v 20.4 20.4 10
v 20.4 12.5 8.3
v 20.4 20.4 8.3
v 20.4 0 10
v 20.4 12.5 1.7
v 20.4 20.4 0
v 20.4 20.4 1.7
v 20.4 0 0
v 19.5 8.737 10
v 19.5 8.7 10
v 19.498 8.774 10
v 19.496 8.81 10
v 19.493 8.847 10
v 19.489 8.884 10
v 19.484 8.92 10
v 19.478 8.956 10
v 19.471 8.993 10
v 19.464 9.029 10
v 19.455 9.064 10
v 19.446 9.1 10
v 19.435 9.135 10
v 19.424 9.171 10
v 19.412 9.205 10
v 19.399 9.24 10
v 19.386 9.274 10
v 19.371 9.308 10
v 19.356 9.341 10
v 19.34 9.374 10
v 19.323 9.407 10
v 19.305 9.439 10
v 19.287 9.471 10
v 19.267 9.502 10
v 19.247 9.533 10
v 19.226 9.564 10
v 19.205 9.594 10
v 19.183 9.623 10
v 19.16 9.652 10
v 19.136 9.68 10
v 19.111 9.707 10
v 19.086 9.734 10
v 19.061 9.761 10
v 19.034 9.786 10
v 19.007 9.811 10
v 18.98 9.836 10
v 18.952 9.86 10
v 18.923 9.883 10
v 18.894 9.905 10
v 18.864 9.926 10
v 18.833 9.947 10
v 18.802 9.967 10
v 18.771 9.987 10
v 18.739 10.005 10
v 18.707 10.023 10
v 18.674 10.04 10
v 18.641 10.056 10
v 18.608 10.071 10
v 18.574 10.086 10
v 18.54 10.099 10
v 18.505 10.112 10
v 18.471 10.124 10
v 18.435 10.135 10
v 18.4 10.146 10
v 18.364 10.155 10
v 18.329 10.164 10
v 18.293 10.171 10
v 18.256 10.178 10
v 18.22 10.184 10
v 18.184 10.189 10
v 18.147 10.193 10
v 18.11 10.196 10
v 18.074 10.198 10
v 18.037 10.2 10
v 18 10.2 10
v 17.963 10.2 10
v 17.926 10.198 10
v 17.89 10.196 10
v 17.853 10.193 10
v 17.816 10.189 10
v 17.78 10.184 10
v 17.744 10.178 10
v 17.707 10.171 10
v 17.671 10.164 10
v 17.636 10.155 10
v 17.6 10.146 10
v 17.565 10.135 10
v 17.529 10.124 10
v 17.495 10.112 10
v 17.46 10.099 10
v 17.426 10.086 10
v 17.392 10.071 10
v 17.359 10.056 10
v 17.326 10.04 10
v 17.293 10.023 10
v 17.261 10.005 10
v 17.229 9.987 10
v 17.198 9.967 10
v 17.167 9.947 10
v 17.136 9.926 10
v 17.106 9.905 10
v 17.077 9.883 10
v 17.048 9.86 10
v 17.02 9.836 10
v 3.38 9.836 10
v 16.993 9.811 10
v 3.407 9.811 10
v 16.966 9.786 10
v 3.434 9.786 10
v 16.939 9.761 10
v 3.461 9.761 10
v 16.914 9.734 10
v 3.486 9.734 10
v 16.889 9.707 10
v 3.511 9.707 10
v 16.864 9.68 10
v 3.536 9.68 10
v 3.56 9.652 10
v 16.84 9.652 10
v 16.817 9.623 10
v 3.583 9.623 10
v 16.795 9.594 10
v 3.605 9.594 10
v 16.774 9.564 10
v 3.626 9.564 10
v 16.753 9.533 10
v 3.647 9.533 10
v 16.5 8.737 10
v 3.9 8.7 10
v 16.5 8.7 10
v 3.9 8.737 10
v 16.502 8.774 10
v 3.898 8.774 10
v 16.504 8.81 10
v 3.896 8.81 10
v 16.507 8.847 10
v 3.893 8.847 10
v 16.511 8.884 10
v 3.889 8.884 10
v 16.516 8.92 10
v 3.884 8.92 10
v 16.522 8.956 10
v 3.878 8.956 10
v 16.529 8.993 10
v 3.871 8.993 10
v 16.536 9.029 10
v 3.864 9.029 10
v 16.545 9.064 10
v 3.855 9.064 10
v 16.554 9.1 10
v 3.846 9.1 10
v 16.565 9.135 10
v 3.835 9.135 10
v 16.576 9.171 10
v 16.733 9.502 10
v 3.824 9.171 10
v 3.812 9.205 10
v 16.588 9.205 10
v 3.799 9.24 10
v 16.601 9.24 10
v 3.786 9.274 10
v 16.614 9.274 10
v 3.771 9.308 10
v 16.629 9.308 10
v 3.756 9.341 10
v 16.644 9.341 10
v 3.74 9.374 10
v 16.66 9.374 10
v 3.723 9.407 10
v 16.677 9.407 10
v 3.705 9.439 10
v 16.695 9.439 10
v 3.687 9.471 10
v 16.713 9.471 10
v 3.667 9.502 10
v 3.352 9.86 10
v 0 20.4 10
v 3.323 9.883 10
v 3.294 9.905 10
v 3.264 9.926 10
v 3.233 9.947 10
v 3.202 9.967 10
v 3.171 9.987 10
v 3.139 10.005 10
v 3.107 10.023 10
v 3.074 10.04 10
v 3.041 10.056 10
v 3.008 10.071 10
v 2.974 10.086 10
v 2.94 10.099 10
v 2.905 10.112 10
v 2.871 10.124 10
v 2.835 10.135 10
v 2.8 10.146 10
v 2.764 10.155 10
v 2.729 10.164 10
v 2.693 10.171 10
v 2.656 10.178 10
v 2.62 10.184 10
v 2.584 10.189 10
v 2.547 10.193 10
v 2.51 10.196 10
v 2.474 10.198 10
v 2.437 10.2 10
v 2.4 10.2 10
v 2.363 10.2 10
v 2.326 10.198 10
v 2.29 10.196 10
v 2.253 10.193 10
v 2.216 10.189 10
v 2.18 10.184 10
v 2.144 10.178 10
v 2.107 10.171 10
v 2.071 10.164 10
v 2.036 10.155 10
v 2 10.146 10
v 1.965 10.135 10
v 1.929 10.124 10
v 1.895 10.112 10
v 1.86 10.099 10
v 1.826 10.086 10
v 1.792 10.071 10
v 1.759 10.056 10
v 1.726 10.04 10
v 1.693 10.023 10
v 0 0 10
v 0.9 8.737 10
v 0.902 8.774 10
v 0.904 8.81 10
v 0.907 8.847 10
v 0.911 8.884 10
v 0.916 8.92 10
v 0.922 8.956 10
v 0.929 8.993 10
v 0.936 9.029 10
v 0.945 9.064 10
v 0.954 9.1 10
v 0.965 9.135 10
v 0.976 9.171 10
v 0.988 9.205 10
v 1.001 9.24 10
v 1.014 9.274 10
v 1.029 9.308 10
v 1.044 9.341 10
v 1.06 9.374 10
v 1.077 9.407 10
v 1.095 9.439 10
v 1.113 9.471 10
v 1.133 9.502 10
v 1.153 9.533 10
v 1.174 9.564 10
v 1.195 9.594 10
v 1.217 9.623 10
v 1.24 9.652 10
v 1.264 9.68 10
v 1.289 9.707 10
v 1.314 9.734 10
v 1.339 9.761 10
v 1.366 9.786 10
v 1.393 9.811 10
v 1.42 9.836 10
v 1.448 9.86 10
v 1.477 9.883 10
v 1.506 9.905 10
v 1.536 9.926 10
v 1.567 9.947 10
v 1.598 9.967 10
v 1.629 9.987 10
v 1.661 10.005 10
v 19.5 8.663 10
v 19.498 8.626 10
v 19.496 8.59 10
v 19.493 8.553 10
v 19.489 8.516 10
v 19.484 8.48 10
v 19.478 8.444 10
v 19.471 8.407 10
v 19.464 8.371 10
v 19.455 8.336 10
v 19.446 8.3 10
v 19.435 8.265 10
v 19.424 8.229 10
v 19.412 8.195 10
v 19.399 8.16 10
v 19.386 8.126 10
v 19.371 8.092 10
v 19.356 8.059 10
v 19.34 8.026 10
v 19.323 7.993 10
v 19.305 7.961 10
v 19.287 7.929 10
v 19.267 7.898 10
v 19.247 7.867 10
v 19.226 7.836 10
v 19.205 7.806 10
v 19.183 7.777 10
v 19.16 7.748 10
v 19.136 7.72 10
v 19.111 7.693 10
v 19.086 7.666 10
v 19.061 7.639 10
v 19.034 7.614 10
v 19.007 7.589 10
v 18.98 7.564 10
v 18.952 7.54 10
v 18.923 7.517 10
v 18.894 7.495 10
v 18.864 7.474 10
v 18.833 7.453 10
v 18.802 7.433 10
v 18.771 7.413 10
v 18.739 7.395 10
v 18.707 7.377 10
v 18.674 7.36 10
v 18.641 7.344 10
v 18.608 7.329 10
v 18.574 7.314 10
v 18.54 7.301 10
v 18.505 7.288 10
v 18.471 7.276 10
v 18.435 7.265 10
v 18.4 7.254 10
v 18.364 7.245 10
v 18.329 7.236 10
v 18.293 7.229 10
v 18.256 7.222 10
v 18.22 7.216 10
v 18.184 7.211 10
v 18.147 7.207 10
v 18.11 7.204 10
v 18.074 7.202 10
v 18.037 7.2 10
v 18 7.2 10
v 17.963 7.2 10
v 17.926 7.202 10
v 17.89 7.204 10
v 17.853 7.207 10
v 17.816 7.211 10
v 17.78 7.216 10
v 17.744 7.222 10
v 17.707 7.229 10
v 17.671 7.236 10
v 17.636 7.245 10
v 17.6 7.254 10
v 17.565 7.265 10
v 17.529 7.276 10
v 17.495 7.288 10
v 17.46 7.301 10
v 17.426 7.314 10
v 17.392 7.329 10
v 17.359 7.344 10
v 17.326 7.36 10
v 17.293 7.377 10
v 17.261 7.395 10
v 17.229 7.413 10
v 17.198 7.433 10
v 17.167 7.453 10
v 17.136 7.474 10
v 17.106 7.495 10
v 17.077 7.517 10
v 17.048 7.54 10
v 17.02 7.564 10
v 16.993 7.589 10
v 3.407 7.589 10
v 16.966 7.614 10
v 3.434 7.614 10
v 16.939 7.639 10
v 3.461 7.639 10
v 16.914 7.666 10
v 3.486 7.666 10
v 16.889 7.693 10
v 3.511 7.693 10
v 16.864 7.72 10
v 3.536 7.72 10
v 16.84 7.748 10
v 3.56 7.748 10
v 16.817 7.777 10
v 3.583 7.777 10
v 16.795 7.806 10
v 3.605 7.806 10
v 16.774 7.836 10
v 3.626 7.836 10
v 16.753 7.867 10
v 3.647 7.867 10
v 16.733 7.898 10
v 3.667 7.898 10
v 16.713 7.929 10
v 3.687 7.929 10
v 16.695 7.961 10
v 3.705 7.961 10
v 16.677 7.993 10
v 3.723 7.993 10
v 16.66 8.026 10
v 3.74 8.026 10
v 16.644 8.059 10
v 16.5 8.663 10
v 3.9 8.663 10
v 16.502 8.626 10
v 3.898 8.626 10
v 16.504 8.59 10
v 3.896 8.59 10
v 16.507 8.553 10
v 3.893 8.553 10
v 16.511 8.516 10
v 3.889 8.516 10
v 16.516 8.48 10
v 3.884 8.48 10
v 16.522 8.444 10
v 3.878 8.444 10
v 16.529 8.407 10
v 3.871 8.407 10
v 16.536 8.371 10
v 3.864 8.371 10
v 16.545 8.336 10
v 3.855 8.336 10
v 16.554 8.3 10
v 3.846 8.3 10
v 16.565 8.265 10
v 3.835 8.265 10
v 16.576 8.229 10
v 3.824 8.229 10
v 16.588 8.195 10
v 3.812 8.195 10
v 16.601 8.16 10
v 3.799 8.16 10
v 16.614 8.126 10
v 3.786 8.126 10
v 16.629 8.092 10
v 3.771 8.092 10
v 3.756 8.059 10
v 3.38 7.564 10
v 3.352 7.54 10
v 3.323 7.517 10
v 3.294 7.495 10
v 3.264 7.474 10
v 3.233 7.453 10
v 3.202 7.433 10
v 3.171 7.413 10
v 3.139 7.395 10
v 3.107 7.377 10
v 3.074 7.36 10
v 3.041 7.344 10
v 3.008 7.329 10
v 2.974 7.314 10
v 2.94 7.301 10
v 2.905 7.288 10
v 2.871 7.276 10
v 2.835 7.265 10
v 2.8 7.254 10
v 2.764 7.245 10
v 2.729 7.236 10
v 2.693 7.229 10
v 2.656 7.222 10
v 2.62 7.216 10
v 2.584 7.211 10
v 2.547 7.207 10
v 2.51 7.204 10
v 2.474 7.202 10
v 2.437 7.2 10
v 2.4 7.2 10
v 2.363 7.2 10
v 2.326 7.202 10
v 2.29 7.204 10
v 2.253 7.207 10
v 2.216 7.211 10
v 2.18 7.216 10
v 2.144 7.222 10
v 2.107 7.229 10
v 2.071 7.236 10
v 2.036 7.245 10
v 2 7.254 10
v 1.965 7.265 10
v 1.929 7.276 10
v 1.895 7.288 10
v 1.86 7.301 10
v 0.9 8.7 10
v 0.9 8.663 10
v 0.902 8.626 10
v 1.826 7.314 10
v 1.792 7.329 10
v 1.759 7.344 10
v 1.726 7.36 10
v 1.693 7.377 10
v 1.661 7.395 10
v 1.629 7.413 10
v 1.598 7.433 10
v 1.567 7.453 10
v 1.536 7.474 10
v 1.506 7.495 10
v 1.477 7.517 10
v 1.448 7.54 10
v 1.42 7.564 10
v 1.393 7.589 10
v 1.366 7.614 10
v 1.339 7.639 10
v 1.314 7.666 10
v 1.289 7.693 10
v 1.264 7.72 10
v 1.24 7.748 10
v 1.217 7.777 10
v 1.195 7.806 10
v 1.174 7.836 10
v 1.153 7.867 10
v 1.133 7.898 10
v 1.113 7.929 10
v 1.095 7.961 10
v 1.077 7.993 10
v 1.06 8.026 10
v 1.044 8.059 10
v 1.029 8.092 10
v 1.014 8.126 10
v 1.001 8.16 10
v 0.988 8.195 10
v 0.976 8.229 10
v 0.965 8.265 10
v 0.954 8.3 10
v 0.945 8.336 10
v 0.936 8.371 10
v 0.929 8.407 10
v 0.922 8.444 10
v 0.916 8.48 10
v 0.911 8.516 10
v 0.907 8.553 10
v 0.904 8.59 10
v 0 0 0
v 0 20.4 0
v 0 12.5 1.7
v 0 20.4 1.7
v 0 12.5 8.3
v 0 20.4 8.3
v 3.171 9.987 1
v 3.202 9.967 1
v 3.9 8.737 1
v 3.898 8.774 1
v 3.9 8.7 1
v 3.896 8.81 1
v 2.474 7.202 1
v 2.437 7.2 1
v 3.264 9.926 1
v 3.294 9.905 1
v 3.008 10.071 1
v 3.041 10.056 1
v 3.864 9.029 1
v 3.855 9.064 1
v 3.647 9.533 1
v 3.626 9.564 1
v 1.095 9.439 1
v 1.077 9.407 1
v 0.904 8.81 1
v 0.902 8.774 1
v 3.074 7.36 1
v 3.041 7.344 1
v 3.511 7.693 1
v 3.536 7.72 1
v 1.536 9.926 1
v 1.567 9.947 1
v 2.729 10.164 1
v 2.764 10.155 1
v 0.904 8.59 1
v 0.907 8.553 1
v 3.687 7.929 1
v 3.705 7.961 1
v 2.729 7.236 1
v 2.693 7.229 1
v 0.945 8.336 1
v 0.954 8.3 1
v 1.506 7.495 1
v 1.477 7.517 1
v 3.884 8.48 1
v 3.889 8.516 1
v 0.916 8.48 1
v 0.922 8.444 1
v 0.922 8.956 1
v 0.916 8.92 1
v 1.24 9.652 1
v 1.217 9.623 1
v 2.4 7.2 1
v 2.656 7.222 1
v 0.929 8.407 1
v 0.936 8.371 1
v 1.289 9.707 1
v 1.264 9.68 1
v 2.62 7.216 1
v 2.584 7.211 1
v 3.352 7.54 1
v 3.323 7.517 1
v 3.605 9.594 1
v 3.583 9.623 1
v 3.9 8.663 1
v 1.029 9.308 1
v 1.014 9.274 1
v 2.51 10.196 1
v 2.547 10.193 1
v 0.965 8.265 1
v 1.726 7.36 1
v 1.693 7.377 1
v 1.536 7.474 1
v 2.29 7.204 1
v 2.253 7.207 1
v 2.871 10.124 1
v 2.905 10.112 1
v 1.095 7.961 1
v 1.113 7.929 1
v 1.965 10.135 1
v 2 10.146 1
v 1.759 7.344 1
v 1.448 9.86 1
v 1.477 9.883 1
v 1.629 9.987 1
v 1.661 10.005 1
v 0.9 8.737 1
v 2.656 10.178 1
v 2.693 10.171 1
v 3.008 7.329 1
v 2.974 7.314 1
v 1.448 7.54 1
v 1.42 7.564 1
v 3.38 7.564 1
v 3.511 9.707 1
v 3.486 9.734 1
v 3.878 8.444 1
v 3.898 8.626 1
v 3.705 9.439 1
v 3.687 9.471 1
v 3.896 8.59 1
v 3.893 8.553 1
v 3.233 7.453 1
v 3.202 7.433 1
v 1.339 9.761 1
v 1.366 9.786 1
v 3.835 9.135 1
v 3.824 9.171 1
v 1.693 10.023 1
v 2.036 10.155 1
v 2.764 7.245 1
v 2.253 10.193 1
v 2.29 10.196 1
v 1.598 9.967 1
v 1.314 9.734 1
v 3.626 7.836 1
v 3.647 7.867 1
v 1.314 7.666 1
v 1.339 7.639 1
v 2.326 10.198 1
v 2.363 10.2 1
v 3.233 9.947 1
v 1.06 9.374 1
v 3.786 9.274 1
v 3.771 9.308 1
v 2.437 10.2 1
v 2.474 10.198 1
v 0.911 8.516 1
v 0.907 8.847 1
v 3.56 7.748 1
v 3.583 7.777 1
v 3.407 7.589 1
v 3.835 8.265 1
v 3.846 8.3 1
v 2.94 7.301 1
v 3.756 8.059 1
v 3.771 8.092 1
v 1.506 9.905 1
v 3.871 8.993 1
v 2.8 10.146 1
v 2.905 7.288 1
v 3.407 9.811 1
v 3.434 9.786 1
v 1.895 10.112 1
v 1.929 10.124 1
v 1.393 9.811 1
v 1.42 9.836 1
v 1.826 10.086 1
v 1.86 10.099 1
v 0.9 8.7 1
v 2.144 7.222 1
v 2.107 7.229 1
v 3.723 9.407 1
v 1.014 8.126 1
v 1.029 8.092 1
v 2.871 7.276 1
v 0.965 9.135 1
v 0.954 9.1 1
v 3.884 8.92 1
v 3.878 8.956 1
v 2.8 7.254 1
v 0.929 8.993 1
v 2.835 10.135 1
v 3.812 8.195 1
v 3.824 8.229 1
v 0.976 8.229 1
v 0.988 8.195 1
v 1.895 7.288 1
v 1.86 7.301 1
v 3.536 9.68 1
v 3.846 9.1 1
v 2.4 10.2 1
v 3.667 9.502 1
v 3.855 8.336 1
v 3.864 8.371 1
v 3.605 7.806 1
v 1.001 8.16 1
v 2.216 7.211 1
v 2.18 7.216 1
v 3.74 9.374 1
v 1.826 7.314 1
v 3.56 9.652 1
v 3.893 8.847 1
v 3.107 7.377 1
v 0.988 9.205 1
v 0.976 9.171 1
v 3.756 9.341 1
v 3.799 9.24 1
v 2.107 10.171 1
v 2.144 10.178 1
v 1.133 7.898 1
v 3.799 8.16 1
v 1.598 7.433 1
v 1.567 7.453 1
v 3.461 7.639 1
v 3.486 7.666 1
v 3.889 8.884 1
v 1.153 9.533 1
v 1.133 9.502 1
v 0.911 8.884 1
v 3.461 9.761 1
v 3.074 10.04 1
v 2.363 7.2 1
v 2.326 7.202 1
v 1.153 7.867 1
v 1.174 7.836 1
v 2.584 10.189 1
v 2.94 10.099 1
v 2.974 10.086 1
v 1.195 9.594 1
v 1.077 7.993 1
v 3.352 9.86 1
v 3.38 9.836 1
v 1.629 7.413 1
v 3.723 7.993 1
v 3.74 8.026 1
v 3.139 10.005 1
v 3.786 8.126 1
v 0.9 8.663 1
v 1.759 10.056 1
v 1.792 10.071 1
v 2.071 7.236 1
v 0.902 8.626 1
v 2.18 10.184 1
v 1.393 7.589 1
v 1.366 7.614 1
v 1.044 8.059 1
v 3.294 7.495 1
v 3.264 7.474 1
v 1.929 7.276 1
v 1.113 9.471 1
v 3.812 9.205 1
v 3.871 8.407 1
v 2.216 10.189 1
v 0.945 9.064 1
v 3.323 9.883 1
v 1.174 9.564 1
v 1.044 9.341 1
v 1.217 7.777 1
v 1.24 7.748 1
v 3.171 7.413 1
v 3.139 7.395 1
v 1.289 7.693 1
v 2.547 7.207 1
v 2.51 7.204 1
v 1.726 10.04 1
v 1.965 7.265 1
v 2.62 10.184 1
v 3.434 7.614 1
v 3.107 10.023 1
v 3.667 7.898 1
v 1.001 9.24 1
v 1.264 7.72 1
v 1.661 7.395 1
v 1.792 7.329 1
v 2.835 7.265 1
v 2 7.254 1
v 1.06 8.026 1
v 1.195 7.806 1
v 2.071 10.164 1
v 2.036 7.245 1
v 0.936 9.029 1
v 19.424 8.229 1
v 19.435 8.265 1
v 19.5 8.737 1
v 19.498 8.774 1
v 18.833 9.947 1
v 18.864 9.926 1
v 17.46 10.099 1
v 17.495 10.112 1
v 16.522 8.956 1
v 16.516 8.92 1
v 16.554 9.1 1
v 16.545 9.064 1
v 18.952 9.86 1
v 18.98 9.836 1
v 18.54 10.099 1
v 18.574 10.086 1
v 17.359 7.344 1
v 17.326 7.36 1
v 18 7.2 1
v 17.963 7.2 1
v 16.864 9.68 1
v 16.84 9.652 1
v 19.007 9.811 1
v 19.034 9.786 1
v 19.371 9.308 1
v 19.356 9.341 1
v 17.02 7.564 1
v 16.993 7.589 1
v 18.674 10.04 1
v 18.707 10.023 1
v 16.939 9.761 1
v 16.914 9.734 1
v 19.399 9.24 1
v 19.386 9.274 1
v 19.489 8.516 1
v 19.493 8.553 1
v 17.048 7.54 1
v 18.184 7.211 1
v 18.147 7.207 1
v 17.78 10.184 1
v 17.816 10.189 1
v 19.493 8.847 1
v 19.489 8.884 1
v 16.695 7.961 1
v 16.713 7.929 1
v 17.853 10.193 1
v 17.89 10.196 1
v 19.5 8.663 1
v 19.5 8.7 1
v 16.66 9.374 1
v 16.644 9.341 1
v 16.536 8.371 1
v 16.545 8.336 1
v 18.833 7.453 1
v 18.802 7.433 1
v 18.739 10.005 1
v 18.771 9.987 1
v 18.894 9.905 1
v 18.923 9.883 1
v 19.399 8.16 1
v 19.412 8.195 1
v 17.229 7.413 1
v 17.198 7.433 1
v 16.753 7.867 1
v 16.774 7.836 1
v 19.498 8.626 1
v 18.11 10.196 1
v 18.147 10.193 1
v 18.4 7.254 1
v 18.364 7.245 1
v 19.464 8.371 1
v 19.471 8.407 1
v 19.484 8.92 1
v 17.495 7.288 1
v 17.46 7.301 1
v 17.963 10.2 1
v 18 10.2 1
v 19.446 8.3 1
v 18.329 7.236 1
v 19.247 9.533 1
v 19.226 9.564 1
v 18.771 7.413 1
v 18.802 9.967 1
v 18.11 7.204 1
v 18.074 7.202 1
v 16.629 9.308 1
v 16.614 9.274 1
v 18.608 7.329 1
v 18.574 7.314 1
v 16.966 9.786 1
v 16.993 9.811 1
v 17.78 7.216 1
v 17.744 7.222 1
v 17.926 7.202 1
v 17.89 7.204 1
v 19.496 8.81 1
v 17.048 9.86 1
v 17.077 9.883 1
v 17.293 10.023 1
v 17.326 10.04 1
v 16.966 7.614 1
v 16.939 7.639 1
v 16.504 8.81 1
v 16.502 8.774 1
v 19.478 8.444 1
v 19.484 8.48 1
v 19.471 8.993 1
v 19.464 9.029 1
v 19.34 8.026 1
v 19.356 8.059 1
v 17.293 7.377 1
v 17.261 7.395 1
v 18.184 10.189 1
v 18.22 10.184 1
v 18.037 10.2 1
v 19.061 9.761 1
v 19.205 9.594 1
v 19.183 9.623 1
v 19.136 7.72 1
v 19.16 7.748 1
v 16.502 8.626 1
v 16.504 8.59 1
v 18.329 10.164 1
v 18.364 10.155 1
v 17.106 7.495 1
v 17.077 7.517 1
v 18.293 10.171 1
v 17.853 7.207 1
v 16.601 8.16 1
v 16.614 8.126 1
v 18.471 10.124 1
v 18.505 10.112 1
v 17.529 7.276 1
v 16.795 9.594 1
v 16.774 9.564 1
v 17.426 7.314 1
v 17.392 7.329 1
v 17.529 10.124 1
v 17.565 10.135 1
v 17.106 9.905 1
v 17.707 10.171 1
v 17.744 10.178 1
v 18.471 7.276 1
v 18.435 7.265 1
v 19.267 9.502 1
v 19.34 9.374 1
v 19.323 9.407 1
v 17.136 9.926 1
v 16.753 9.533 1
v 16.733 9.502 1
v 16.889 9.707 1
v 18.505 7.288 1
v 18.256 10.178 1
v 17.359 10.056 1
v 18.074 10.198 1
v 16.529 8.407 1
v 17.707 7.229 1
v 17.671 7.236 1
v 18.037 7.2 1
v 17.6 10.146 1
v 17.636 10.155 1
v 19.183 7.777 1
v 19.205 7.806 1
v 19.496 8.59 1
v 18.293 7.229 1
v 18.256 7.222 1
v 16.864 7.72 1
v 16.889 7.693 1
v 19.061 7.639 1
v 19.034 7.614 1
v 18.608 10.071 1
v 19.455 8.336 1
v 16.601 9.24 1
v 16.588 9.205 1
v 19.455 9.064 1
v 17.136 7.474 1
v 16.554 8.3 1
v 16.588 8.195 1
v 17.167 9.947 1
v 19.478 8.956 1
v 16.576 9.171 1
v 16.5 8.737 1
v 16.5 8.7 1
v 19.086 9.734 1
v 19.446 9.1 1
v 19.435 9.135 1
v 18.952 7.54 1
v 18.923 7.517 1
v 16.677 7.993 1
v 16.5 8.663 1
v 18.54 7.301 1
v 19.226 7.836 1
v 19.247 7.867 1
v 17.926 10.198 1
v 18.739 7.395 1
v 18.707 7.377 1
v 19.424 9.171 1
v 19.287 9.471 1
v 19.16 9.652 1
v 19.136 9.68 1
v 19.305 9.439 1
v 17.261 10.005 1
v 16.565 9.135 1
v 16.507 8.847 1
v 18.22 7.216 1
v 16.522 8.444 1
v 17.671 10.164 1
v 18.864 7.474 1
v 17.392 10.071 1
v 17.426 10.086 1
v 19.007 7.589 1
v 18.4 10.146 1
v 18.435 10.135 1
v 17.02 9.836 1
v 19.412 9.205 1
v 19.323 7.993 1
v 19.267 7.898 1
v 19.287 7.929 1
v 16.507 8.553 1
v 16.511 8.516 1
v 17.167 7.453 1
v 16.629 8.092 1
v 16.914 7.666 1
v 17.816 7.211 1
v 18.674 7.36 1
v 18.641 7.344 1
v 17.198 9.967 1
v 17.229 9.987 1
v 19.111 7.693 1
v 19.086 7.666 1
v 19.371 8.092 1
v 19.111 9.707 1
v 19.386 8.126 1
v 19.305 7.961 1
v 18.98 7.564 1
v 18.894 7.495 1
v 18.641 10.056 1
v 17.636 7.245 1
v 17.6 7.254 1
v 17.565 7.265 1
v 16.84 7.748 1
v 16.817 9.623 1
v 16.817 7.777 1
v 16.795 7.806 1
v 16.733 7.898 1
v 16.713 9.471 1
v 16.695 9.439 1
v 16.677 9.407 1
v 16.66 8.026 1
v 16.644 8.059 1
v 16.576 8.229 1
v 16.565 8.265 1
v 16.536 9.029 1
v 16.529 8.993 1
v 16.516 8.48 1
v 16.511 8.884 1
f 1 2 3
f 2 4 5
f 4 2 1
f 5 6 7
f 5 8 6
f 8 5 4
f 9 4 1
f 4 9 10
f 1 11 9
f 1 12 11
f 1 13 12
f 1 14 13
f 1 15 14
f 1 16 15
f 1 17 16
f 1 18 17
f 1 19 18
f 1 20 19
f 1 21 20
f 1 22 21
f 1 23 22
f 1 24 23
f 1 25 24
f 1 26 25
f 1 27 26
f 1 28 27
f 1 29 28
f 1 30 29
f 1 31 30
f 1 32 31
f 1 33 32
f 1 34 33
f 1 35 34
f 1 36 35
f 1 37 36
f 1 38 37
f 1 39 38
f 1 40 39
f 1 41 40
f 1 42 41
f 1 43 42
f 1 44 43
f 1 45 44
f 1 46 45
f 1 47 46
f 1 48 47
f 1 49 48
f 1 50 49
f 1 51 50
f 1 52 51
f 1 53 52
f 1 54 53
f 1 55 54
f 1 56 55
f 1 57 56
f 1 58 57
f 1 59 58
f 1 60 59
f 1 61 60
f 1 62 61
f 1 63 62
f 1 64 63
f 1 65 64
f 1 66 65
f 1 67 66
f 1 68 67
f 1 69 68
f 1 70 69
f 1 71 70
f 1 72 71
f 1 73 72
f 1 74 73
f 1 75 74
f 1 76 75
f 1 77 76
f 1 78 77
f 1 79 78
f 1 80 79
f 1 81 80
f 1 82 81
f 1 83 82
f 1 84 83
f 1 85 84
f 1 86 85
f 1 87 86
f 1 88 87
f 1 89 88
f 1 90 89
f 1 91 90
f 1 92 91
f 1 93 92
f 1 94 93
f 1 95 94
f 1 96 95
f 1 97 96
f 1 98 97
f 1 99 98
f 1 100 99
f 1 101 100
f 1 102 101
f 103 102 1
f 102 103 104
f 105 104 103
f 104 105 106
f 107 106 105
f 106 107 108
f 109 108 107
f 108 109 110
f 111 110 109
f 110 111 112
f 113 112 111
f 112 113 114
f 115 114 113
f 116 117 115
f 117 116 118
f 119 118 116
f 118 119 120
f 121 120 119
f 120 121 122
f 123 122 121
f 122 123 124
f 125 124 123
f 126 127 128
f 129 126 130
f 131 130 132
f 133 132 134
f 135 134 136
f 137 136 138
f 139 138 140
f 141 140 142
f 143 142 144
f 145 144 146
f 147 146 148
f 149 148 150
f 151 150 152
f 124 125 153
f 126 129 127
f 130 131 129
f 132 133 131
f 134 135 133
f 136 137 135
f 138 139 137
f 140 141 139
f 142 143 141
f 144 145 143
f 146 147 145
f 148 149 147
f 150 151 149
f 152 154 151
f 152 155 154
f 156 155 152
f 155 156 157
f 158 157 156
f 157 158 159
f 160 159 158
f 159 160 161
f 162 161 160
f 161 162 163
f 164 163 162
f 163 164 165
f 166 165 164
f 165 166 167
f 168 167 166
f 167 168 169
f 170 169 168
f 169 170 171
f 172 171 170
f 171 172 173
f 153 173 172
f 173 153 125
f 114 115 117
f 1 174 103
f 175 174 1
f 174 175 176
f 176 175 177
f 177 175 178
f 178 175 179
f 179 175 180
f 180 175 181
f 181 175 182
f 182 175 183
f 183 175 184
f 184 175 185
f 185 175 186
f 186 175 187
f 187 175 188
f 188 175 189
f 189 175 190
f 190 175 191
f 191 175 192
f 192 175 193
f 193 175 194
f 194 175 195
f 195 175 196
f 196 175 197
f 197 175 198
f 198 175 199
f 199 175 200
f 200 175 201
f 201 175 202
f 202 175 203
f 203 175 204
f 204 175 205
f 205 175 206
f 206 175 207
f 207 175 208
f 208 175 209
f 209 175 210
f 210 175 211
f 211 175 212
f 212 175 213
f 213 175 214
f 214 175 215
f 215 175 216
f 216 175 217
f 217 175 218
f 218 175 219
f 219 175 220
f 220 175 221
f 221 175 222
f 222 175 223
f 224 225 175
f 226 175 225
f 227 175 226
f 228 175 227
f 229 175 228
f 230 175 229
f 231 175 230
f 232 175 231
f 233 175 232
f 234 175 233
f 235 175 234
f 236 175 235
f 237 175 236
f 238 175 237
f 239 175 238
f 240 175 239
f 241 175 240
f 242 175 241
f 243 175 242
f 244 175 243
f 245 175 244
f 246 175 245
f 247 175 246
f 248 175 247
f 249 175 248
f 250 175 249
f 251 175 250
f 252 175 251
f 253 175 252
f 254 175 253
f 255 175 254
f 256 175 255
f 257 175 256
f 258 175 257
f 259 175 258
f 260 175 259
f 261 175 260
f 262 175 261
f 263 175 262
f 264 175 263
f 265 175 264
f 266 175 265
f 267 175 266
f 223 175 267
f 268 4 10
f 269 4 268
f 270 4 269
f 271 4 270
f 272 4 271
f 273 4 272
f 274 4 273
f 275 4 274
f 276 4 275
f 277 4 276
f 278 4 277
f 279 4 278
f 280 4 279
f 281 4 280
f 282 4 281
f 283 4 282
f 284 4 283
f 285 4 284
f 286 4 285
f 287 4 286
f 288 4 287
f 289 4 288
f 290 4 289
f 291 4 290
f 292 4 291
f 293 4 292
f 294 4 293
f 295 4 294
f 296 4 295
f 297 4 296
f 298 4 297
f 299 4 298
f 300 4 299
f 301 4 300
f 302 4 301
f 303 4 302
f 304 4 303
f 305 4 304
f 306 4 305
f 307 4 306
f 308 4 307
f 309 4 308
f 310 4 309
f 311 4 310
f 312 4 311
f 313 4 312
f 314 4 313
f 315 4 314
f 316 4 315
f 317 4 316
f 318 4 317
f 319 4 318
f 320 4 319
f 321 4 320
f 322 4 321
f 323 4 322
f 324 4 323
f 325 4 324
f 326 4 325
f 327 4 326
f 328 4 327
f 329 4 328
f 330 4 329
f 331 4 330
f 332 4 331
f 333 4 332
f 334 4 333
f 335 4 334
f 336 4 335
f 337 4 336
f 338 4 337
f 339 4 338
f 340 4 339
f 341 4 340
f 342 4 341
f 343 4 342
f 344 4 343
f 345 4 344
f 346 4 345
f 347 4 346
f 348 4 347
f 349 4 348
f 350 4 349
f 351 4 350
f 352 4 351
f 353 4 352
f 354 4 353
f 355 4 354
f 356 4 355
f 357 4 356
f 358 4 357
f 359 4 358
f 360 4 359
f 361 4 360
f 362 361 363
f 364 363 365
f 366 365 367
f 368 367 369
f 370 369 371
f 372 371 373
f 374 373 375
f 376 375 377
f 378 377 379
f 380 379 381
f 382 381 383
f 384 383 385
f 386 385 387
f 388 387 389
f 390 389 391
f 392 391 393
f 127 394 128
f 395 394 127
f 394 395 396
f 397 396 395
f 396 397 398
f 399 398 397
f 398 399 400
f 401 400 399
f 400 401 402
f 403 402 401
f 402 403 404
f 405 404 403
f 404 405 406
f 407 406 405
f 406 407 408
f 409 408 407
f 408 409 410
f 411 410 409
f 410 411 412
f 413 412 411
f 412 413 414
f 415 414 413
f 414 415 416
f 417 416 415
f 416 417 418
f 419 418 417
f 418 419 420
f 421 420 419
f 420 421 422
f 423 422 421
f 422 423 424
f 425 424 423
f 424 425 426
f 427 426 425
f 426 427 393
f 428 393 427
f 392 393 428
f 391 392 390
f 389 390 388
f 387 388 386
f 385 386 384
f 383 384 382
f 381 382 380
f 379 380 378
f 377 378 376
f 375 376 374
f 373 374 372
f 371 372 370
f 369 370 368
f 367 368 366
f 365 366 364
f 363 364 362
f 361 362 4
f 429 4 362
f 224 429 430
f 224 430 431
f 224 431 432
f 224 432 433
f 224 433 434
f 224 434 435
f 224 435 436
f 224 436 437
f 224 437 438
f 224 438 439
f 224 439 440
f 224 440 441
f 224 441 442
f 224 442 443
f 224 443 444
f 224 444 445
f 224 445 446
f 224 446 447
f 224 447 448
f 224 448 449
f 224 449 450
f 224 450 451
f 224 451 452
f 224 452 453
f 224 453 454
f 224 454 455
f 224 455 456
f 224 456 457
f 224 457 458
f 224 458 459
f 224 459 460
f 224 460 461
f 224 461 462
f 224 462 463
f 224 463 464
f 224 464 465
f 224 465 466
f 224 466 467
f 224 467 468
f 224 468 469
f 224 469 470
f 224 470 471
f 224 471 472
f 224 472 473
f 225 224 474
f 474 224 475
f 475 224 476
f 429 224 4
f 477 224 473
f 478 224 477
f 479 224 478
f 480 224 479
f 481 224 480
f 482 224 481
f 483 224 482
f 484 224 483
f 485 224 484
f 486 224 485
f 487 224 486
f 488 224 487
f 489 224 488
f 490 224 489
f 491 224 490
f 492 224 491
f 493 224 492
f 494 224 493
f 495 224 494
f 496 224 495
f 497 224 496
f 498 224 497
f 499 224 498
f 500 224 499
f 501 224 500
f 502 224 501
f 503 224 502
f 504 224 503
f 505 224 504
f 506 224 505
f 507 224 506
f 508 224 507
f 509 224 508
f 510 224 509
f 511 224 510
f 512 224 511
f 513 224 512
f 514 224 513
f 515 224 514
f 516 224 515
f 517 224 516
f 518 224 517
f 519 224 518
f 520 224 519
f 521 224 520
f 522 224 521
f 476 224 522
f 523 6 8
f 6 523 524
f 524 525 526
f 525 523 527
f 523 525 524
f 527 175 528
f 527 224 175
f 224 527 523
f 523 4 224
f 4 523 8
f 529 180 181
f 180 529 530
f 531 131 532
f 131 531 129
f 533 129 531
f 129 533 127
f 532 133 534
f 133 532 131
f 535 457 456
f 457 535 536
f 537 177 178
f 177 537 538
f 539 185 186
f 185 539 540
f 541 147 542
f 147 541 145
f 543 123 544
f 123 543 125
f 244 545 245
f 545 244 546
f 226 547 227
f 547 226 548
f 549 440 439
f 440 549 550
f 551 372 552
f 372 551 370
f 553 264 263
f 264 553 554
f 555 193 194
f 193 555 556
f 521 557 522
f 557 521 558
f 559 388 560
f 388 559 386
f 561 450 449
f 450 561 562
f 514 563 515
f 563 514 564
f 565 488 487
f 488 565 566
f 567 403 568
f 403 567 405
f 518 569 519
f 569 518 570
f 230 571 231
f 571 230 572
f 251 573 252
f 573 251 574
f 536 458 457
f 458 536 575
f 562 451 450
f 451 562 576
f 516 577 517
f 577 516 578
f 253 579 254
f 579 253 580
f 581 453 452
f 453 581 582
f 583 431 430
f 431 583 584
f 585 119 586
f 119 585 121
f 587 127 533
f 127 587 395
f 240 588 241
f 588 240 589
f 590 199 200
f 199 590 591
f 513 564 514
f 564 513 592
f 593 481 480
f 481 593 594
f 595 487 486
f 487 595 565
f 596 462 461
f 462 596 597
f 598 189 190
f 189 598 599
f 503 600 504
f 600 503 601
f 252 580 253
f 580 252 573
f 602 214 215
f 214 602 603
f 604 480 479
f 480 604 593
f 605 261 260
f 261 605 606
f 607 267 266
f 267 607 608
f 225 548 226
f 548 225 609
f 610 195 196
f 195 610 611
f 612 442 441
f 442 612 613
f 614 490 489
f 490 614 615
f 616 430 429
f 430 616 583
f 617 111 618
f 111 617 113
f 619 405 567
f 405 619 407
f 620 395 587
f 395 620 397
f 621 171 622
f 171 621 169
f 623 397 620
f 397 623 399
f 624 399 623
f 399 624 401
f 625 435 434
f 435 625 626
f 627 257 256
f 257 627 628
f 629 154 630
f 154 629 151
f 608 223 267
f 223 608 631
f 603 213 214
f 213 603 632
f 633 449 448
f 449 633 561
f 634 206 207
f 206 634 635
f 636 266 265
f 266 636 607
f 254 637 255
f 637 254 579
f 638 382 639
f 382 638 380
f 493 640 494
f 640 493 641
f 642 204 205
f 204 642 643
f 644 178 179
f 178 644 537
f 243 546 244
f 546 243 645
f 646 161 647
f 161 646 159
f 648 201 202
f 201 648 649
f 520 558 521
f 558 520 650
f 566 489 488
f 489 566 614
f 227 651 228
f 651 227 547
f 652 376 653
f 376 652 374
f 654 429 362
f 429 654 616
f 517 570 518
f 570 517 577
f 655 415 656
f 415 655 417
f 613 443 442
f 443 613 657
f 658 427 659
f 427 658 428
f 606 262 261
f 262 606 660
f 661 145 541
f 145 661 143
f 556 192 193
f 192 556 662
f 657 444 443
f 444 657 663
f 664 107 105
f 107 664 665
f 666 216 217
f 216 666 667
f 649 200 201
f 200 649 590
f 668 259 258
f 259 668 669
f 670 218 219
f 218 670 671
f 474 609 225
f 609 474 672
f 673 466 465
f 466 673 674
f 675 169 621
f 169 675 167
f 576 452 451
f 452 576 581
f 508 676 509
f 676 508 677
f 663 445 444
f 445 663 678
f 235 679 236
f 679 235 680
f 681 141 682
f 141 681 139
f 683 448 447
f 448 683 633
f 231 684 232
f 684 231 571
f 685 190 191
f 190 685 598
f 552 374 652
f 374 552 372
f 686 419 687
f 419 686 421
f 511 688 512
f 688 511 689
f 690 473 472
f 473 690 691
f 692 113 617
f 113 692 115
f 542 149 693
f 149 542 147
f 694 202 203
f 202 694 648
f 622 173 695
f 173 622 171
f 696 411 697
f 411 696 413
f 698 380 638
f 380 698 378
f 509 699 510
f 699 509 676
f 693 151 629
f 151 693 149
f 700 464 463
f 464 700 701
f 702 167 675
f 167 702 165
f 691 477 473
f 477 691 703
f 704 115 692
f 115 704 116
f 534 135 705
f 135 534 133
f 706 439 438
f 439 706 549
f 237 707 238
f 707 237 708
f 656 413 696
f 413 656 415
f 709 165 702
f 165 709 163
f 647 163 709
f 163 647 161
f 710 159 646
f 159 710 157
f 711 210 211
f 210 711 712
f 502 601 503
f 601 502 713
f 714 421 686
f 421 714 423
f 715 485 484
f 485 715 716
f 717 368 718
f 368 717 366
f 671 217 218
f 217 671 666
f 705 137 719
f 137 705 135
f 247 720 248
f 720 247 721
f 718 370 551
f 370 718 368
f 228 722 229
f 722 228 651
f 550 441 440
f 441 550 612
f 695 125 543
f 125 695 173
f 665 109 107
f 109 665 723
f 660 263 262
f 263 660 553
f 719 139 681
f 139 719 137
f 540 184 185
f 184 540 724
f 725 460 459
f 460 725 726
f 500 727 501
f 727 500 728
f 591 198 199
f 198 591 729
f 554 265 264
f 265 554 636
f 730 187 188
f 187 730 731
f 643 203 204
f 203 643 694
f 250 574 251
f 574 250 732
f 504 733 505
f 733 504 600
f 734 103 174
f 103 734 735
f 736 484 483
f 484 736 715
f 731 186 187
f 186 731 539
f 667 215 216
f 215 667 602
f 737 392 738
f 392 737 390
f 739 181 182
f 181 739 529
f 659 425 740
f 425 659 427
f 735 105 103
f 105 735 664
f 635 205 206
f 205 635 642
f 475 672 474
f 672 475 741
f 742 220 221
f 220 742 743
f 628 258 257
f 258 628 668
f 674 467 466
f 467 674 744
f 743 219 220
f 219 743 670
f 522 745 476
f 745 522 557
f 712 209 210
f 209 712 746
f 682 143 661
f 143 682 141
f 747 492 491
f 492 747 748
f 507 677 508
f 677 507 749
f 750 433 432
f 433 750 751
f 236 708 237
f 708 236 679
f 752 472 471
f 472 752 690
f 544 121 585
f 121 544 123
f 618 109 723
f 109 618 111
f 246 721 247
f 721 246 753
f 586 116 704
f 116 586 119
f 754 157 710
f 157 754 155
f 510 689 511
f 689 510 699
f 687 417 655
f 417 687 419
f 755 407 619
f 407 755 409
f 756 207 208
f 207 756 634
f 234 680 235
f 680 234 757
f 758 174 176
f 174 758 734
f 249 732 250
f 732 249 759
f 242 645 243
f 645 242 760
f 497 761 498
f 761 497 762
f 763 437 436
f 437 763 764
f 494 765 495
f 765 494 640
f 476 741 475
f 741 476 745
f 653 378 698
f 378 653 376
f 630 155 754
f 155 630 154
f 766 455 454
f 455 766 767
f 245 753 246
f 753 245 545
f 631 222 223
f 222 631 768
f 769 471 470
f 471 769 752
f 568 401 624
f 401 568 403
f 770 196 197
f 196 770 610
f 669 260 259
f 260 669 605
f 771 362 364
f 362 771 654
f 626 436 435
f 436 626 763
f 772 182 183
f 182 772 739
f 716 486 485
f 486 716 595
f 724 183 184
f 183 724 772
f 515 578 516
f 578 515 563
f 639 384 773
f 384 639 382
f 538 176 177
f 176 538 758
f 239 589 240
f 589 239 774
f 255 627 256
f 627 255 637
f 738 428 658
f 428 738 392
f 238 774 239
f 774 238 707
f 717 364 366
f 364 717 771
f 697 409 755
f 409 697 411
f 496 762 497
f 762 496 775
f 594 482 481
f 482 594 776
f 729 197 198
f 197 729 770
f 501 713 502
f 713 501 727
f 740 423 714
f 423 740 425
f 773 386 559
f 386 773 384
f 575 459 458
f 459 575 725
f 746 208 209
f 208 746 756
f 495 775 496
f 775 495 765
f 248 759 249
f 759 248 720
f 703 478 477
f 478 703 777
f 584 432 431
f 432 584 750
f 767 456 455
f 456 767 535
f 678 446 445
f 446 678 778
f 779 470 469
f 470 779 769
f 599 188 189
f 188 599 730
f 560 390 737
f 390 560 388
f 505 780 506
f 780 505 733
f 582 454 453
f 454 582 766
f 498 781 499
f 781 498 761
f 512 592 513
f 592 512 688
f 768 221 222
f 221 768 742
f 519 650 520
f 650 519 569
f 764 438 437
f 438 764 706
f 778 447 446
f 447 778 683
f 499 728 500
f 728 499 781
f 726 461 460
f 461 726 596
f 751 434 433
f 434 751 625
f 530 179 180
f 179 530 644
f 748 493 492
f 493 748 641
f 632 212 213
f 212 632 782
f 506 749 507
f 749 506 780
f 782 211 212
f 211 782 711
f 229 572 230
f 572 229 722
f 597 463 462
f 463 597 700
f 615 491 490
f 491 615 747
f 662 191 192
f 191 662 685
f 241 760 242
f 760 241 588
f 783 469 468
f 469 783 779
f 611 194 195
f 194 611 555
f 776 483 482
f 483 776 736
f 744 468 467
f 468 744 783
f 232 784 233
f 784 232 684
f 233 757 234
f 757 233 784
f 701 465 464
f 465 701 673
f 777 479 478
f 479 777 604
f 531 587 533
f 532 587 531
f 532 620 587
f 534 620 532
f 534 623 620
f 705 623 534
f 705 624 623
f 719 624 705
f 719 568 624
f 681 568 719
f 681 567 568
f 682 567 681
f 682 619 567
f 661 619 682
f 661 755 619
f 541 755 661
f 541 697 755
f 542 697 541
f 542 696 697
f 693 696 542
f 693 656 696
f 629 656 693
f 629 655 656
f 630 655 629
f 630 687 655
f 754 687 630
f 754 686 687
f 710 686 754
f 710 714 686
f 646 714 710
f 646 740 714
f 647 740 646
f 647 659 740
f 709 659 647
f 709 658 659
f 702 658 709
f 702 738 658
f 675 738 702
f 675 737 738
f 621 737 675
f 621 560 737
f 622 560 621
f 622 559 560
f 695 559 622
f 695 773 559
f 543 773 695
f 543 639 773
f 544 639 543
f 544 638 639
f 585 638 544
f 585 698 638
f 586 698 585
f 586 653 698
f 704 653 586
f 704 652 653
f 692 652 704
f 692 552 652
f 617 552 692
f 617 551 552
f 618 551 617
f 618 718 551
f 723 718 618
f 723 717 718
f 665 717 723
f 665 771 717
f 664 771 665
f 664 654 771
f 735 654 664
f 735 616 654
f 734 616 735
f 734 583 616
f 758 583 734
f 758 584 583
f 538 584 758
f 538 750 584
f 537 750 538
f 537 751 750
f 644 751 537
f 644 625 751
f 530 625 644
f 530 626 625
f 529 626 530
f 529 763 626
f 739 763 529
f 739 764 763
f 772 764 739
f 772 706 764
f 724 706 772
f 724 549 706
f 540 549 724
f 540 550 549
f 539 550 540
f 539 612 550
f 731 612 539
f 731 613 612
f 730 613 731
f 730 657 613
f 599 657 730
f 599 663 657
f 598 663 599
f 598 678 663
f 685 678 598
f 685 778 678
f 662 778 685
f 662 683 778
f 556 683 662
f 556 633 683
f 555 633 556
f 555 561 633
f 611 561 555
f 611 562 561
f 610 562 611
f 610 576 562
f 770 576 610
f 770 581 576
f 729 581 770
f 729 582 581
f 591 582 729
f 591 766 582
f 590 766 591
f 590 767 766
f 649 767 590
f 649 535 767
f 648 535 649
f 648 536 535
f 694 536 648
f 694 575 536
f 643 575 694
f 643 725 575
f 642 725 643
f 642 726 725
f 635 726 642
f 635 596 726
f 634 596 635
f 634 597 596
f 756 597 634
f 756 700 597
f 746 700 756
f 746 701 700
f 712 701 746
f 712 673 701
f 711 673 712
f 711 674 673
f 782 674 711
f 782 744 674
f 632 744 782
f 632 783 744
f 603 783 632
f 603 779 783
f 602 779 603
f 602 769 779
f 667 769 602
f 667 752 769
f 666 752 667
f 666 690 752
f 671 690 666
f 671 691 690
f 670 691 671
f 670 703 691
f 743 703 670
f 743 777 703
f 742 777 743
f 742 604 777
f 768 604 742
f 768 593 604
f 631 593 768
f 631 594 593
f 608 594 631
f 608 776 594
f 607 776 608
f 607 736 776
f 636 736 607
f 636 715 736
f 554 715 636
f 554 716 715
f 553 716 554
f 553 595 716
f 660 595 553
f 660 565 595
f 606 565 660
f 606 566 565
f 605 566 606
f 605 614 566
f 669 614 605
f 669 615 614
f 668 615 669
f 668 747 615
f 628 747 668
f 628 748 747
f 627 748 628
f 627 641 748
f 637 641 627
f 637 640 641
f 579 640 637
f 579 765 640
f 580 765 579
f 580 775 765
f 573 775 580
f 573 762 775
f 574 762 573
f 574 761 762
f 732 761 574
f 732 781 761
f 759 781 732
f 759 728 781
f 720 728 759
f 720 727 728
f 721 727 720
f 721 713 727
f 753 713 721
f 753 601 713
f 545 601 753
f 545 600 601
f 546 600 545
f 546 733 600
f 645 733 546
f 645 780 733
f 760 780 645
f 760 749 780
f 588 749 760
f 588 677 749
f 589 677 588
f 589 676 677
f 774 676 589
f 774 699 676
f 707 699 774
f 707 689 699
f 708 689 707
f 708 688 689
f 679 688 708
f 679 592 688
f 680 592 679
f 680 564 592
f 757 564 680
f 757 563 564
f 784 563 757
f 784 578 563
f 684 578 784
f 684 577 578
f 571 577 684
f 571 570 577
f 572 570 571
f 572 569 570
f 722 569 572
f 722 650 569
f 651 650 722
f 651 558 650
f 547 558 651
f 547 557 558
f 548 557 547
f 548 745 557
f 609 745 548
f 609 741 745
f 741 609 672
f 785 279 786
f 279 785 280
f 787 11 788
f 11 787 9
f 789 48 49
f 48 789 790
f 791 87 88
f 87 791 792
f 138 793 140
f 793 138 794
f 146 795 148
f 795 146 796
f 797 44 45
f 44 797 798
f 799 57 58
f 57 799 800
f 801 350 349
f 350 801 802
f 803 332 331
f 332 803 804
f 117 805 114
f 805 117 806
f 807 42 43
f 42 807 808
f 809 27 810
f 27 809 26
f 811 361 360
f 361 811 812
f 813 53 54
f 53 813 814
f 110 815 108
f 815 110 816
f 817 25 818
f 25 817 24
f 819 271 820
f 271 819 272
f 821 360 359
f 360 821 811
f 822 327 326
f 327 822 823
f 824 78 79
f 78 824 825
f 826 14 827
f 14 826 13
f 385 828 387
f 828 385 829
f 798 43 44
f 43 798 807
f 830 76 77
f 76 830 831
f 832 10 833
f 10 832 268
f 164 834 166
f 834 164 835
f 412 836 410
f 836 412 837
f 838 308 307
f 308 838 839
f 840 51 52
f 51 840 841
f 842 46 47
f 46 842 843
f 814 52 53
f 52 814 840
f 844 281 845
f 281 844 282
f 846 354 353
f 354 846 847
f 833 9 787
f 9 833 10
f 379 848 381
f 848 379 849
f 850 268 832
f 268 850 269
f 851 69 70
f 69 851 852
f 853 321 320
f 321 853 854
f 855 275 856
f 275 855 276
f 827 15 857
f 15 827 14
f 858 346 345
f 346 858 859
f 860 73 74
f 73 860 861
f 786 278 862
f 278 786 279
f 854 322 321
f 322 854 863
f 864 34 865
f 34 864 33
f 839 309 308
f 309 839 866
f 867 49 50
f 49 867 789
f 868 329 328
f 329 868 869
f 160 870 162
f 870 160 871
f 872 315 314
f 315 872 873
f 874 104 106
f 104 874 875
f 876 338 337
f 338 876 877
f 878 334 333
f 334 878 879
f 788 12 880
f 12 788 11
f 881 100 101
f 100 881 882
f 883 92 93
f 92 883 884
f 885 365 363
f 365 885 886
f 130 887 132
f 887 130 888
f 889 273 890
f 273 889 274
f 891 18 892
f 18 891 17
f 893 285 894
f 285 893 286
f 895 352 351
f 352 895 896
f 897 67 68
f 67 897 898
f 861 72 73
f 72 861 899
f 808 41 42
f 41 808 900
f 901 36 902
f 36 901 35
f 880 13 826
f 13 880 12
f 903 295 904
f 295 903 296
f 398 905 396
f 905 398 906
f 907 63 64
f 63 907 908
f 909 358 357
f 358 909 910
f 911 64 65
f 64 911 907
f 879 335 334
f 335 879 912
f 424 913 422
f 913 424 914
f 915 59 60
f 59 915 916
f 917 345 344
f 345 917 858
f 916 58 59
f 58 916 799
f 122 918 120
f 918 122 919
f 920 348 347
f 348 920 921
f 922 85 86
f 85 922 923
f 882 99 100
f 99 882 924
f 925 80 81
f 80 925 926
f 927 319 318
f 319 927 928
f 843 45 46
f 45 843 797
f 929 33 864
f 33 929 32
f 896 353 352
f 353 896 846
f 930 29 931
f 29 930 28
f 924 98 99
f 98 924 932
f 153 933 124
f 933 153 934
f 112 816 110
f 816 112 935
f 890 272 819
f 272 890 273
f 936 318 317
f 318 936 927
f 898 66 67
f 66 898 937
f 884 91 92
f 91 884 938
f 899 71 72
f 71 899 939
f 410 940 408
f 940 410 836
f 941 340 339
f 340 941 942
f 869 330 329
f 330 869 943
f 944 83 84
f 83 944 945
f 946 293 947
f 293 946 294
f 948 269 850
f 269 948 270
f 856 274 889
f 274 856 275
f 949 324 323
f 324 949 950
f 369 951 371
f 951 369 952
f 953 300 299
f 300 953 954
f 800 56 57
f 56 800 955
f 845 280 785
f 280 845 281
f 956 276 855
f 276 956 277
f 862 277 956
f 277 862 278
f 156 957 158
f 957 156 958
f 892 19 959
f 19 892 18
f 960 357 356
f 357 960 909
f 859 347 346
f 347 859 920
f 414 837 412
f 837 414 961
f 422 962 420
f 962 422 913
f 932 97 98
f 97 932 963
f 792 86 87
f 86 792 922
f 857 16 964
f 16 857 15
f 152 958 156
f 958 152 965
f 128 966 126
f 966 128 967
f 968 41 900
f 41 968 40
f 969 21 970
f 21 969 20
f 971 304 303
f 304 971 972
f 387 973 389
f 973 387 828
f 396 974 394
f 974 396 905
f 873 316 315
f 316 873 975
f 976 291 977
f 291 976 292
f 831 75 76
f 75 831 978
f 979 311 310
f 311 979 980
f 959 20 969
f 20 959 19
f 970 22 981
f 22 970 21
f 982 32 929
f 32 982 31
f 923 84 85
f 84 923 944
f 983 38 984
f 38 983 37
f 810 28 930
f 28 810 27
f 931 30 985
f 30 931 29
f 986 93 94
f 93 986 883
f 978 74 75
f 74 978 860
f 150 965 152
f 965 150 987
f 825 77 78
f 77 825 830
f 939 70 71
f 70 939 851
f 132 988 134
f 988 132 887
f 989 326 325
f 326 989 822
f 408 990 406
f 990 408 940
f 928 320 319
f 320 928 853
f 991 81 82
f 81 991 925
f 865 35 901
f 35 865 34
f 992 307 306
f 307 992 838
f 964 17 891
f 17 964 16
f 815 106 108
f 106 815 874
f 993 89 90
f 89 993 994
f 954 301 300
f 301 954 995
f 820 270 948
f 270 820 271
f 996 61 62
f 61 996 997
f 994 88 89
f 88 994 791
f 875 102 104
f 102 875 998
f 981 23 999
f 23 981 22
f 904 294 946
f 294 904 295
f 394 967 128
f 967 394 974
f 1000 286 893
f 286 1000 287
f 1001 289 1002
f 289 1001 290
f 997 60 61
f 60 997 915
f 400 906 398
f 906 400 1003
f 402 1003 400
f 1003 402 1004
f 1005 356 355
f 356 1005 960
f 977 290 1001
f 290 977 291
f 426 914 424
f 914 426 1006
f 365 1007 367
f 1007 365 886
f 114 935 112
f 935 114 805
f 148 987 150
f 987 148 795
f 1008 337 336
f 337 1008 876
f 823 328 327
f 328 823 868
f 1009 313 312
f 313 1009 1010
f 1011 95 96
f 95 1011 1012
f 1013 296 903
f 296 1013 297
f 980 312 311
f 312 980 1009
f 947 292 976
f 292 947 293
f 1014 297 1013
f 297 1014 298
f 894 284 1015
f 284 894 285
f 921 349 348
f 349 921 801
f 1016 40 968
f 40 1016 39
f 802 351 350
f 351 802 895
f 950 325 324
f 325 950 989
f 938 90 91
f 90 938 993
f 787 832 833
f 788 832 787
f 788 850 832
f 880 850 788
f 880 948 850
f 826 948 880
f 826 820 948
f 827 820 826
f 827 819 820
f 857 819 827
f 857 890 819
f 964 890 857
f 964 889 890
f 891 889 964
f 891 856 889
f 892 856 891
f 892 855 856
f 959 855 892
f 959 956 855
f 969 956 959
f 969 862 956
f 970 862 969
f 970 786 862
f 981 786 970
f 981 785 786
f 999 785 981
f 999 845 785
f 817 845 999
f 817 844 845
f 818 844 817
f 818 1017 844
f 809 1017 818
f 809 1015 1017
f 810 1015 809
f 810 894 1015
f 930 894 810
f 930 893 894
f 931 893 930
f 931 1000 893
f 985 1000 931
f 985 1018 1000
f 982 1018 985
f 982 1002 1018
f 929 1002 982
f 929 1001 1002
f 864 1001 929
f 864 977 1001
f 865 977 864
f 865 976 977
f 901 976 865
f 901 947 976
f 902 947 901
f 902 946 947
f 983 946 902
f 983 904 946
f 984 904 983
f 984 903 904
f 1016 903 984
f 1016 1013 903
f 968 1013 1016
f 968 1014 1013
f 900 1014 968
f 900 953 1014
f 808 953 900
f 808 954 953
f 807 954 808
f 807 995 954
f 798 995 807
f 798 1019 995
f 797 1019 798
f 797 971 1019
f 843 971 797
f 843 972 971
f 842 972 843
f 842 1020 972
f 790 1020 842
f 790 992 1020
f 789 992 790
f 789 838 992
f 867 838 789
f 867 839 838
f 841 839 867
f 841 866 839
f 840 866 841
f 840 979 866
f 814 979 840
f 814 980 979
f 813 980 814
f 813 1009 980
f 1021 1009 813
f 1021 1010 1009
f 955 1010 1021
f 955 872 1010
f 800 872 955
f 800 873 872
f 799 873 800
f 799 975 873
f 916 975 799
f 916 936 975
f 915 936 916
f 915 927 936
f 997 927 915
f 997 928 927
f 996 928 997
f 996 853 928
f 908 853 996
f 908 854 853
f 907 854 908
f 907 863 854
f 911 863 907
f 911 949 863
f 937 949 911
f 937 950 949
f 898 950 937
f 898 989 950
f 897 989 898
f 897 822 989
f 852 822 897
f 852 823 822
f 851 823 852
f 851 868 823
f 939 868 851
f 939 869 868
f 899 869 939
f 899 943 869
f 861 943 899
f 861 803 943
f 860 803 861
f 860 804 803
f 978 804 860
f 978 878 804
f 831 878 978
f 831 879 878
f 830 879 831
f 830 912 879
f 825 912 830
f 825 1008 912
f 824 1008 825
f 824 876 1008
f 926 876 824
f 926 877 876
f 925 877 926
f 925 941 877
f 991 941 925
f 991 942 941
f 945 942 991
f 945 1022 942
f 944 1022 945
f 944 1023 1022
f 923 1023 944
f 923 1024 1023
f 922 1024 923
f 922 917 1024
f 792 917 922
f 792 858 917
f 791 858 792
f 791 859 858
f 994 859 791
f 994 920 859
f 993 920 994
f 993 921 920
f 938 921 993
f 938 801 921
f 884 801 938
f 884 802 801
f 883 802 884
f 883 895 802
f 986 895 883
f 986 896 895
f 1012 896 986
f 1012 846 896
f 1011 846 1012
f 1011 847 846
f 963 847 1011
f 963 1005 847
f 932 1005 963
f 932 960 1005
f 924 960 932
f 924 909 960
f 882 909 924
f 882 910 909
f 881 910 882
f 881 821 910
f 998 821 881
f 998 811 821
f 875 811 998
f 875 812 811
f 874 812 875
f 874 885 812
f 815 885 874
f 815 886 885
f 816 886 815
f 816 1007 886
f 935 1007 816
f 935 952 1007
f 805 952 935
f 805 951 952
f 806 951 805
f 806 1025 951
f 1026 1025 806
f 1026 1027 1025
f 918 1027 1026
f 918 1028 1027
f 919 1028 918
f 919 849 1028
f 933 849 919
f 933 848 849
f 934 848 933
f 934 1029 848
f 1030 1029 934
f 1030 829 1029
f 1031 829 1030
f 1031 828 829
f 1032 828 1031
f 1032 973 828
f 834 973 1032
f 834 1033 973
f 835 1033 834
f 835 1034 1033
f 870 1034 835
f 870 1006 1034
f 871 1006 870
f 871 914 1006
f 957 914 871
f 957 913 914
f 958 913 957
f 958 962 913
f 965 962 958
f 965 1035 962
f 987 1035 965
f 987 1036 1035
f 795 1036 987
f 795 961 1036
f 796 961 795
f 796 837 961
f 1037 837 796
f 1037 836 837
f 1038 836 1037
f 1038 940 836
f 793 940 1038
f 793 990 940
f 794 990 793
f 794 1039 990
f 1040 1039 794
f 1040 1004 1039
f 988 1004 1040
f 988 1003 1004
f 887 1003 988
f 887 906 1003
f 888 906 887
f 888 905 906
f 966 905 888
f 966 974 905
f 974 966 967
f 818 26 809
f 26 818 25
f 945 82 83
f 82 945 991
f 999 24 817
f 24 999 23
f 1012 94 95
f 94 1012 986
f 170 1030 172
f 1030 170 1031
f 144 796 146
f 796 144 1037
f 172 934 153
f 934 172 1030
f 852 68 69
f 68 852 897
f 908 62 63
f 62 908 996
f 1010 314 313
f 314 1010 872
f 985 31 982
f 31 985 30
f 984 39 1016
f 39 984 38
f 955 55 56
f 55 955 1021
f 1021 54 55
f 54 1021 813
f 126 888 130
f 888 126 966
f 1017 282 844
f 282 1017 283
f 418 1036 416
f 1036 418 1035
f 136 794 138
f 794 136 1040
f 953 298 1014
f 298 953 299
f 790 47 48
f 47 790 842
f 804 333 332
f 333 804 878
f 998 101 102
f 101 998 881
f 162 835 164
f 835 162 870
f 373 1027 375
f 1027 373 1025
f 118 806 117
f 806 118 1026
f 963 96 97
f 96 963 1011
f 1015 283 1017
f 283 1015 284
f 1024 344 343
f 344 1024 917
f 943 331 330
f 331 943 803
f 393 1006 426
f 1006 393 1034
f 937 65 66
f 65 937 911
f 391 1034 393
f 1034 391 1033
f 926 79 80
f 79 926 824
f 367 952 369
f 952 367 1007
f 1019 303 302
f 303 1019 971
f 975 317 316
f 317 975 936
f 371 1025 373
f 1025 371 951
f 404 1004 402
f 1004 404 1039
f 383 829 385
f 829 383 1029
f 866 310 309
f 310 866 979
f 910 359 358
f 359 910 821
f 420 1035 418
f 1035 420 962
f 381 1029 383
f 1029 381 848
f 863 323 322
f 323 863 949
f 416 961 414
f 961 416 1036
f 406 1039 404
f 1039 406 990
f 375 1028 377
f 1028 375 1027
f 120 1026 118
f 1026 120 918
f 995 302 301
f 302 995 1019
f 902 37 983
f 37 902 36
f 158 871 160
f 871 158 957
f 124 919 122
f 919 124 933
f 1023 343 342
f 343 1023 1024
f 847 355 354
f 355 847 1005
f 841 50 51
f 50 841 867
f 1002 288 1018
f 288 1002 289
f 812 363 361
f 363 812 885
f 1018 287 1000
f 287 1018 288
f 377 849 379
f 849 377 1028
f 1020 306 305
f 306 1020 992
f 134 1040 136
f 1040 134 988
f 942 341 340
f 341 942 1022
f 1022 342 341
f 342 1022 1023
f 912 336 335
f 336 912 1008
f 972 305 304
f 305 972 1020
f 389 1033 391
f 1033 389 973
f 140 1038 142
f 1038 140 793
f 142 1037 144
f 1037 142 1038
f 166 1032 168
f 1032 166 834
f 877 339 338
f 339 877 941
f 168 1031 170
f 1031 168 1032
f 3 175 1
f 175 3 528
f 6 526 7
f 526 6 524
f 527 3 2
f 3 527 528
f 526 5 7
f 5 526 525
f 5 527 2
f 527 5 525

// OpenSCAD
$fn=256;

depth = 6;
diameter = 7.9;
top_clear = 8.1;
right_clear = 2.75;
left_clear = 9.75;
left_clear2 = left_clear - 2;
width = right_clear + diameter + left_clear;
height = diameter + top_clear;

fix_width = 2.65;

total_depth = right_clear + fix_width + depth;
top_height = 10;

difference() {
    cube([width, total_depth, top_height]);
    translate([width / 2 - 15.6 / 2, total_depth / 2 + depth / 2, 1]) cylinder(top_height, 1.5, 1.5);
    translate([width / 2 + 15.6 / 2, total_depth / 2 + depth / 2, 1]) cylinder(top_height, 1.5, 1.5);
}

translate([0, total_depth + 9, 0]) mirror([0, 1, 0])
difference() {
cube([width, 10, top_height]);
translate([-0.5, -0.1, (top_height - 6.6) / 2]) cube([width + 1, 8, 6.60]);
}
